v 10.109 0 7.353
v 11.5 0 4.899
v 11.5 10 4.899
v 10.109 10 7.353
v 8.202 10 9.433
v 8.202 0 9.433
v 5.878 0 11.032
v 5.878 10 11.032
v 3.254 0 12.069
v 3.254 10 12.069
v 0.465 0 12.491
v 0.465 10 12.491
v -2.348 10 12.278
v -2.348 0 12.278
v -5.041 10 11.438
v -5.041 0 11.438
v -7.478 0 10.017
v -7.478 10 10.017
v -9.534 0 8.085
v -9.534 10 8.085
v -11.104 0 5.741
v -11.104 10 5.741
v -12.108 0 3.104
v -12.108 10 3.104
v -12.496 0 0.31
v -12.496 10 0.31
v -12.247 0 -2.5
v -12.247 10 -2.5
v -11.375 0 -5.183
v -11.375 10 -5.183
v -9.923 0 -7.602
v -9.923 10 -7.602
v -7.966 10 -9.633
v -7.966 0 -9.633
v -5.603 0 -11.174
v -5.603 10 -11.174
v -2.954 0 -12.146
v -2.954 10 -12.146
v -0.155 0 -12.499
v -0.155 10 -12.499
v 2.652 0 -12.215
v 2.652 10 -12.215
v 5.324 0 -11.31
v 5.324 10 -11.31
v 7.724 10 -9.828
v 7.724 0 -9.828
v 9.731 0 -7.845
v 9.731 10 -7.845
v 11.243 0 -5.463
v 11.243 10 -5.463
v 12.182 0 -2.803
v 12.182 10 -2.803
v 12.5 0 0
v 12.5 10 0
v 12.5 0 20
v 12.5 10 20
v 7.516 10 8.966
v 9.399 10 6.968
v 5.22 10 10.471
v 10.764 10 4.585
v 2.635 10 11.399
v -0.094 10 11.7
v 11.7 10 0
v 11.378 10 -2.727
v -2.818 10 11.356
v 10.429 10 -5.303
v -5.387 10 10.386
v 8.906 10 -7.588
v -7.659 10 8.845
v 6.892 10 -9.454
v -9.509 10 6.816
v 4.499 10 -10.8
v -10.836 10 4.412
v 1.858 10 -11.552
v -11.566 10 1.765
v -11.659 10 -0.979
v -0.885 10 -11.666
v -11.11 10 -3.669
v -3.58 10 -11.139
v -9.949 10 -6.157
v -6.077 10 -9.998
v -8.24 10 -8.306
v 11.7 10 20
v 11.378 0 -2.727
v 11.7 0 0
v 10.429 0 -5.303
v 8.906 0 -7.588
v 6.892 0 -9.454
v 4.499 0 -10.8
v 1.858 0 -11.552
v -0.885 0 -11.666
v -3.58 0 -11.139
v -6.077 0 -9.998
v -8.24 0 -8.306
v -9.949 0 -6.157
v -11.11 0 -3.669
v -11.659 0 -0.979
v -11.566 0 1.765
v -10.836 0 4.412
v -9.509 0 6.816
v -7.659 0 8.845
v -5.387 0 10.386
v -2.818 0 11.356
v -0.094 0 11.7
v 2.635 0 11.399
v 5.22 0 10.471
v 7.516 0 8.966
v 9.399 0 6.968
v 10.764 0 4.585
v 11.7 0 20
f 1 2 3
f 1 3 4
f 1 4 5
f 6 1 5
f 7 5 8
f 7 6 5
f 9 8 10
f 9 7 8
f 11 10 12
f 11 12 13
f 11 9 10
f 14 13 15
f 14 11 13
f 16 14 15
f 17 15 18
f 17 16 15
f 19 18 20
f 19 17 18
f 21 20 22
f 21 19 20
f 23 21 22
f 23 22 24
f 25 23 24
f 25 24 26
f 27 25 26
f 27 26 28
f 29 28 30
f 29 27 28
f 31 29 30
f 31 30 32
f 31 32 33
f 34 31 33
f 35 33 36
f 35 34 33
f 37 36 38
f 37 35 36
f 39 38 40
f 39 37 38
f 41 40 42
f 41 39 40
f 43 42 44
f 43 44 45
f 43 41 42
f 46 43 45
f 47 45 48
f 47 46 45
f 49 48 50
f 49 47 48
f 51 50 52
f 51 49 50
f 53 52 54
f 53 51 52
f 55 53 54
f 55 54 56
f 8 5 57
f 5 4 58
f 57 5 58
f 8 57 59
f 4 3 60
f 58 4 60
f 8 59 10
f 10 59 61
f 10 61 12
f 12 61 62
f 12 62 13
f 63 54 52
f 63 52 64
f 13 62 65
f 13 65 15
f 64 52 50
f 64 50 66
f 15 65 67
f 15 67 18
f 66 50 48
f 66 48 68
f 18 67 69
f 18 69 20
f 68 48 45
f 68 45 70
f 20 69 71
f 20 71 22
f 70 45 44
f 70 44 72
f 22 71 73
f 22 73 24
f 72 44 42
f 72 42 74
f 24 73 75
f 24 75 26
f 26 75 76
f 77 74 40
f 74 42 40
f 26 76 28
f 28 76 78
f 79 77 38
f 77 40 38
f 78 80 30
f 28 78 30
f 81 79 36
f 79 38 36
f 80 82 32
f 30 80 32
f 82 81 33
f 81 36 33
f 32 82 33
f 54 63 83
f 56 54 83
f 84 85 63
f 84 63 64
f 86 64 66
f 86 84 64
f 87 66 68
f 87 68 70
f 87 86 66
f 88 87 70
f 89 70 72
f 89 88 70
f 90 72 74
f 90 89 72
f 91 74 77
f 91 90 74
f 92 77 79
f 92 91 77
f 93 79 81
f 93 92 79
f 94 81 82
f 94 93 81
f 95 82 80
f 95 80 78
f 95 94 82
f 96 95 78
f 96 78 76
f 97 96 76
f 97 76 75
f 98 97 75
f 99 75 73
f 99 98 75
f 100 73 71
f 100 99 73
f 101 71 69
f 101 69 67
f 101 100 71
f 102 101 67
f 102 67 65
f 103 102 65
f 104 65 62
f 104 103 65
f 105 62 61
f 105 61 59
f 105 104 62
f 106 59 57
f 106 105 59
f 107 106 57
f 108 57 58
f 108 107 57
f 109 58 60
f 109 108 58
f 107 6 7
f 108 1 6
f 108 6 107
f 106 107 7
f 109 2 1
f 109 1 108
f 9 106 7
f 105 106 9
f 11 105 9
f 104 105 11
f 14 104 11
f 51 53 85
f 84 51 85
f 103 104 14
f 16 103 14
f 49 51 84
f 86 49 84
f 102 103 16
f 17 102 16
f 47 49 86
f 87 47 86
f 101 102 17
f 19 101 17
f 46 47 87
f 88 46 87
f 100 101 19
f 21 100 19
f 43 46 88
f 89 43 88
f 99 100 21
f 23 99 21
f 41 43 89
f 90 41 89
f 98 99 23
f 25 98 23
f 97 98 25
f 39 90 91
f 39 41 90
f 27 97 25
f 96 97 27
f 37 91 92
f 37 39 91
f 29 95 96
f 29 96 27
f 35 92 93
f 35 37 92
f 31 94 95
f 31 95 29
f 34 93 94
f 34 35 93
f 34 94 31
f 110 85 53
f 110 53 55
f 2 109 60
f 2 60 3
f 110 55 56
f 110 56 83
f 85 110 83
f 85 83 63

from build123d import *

# Parameters (mm, degrees)
BASE_FLANGE1_DEPTH = 10


# Sheet-metal steps are written as plain solids
with BuildPart() as part:
    # Sketch2 → Base-Flange1 (new body)
    with BuildSketch(Plane(origin=(0, 0, 0), x_dir=(1, 0, 0), z_dir=(0, 1, 0))):
        with BuildLine():
            ThreePointArc((11.5, -4.898979486), (-12.247448714, 2.5), (12.5, 0))
            Line((12.5, 0), (12.5, -20))
            Line((12.5, -20), (11.7, -20))
            Line((11.7, -20), (11.7, 0))
            ThreePointArc((11.7, 0), (-11.463611996, 2.34), (10.764, -4.585444798))
            Line((10.764, -4.585444798), (11.5, -4.898979486))
        make_face()
    extrude(amount=BASE_FLANGE1_DEPTH)


solid = part.part
